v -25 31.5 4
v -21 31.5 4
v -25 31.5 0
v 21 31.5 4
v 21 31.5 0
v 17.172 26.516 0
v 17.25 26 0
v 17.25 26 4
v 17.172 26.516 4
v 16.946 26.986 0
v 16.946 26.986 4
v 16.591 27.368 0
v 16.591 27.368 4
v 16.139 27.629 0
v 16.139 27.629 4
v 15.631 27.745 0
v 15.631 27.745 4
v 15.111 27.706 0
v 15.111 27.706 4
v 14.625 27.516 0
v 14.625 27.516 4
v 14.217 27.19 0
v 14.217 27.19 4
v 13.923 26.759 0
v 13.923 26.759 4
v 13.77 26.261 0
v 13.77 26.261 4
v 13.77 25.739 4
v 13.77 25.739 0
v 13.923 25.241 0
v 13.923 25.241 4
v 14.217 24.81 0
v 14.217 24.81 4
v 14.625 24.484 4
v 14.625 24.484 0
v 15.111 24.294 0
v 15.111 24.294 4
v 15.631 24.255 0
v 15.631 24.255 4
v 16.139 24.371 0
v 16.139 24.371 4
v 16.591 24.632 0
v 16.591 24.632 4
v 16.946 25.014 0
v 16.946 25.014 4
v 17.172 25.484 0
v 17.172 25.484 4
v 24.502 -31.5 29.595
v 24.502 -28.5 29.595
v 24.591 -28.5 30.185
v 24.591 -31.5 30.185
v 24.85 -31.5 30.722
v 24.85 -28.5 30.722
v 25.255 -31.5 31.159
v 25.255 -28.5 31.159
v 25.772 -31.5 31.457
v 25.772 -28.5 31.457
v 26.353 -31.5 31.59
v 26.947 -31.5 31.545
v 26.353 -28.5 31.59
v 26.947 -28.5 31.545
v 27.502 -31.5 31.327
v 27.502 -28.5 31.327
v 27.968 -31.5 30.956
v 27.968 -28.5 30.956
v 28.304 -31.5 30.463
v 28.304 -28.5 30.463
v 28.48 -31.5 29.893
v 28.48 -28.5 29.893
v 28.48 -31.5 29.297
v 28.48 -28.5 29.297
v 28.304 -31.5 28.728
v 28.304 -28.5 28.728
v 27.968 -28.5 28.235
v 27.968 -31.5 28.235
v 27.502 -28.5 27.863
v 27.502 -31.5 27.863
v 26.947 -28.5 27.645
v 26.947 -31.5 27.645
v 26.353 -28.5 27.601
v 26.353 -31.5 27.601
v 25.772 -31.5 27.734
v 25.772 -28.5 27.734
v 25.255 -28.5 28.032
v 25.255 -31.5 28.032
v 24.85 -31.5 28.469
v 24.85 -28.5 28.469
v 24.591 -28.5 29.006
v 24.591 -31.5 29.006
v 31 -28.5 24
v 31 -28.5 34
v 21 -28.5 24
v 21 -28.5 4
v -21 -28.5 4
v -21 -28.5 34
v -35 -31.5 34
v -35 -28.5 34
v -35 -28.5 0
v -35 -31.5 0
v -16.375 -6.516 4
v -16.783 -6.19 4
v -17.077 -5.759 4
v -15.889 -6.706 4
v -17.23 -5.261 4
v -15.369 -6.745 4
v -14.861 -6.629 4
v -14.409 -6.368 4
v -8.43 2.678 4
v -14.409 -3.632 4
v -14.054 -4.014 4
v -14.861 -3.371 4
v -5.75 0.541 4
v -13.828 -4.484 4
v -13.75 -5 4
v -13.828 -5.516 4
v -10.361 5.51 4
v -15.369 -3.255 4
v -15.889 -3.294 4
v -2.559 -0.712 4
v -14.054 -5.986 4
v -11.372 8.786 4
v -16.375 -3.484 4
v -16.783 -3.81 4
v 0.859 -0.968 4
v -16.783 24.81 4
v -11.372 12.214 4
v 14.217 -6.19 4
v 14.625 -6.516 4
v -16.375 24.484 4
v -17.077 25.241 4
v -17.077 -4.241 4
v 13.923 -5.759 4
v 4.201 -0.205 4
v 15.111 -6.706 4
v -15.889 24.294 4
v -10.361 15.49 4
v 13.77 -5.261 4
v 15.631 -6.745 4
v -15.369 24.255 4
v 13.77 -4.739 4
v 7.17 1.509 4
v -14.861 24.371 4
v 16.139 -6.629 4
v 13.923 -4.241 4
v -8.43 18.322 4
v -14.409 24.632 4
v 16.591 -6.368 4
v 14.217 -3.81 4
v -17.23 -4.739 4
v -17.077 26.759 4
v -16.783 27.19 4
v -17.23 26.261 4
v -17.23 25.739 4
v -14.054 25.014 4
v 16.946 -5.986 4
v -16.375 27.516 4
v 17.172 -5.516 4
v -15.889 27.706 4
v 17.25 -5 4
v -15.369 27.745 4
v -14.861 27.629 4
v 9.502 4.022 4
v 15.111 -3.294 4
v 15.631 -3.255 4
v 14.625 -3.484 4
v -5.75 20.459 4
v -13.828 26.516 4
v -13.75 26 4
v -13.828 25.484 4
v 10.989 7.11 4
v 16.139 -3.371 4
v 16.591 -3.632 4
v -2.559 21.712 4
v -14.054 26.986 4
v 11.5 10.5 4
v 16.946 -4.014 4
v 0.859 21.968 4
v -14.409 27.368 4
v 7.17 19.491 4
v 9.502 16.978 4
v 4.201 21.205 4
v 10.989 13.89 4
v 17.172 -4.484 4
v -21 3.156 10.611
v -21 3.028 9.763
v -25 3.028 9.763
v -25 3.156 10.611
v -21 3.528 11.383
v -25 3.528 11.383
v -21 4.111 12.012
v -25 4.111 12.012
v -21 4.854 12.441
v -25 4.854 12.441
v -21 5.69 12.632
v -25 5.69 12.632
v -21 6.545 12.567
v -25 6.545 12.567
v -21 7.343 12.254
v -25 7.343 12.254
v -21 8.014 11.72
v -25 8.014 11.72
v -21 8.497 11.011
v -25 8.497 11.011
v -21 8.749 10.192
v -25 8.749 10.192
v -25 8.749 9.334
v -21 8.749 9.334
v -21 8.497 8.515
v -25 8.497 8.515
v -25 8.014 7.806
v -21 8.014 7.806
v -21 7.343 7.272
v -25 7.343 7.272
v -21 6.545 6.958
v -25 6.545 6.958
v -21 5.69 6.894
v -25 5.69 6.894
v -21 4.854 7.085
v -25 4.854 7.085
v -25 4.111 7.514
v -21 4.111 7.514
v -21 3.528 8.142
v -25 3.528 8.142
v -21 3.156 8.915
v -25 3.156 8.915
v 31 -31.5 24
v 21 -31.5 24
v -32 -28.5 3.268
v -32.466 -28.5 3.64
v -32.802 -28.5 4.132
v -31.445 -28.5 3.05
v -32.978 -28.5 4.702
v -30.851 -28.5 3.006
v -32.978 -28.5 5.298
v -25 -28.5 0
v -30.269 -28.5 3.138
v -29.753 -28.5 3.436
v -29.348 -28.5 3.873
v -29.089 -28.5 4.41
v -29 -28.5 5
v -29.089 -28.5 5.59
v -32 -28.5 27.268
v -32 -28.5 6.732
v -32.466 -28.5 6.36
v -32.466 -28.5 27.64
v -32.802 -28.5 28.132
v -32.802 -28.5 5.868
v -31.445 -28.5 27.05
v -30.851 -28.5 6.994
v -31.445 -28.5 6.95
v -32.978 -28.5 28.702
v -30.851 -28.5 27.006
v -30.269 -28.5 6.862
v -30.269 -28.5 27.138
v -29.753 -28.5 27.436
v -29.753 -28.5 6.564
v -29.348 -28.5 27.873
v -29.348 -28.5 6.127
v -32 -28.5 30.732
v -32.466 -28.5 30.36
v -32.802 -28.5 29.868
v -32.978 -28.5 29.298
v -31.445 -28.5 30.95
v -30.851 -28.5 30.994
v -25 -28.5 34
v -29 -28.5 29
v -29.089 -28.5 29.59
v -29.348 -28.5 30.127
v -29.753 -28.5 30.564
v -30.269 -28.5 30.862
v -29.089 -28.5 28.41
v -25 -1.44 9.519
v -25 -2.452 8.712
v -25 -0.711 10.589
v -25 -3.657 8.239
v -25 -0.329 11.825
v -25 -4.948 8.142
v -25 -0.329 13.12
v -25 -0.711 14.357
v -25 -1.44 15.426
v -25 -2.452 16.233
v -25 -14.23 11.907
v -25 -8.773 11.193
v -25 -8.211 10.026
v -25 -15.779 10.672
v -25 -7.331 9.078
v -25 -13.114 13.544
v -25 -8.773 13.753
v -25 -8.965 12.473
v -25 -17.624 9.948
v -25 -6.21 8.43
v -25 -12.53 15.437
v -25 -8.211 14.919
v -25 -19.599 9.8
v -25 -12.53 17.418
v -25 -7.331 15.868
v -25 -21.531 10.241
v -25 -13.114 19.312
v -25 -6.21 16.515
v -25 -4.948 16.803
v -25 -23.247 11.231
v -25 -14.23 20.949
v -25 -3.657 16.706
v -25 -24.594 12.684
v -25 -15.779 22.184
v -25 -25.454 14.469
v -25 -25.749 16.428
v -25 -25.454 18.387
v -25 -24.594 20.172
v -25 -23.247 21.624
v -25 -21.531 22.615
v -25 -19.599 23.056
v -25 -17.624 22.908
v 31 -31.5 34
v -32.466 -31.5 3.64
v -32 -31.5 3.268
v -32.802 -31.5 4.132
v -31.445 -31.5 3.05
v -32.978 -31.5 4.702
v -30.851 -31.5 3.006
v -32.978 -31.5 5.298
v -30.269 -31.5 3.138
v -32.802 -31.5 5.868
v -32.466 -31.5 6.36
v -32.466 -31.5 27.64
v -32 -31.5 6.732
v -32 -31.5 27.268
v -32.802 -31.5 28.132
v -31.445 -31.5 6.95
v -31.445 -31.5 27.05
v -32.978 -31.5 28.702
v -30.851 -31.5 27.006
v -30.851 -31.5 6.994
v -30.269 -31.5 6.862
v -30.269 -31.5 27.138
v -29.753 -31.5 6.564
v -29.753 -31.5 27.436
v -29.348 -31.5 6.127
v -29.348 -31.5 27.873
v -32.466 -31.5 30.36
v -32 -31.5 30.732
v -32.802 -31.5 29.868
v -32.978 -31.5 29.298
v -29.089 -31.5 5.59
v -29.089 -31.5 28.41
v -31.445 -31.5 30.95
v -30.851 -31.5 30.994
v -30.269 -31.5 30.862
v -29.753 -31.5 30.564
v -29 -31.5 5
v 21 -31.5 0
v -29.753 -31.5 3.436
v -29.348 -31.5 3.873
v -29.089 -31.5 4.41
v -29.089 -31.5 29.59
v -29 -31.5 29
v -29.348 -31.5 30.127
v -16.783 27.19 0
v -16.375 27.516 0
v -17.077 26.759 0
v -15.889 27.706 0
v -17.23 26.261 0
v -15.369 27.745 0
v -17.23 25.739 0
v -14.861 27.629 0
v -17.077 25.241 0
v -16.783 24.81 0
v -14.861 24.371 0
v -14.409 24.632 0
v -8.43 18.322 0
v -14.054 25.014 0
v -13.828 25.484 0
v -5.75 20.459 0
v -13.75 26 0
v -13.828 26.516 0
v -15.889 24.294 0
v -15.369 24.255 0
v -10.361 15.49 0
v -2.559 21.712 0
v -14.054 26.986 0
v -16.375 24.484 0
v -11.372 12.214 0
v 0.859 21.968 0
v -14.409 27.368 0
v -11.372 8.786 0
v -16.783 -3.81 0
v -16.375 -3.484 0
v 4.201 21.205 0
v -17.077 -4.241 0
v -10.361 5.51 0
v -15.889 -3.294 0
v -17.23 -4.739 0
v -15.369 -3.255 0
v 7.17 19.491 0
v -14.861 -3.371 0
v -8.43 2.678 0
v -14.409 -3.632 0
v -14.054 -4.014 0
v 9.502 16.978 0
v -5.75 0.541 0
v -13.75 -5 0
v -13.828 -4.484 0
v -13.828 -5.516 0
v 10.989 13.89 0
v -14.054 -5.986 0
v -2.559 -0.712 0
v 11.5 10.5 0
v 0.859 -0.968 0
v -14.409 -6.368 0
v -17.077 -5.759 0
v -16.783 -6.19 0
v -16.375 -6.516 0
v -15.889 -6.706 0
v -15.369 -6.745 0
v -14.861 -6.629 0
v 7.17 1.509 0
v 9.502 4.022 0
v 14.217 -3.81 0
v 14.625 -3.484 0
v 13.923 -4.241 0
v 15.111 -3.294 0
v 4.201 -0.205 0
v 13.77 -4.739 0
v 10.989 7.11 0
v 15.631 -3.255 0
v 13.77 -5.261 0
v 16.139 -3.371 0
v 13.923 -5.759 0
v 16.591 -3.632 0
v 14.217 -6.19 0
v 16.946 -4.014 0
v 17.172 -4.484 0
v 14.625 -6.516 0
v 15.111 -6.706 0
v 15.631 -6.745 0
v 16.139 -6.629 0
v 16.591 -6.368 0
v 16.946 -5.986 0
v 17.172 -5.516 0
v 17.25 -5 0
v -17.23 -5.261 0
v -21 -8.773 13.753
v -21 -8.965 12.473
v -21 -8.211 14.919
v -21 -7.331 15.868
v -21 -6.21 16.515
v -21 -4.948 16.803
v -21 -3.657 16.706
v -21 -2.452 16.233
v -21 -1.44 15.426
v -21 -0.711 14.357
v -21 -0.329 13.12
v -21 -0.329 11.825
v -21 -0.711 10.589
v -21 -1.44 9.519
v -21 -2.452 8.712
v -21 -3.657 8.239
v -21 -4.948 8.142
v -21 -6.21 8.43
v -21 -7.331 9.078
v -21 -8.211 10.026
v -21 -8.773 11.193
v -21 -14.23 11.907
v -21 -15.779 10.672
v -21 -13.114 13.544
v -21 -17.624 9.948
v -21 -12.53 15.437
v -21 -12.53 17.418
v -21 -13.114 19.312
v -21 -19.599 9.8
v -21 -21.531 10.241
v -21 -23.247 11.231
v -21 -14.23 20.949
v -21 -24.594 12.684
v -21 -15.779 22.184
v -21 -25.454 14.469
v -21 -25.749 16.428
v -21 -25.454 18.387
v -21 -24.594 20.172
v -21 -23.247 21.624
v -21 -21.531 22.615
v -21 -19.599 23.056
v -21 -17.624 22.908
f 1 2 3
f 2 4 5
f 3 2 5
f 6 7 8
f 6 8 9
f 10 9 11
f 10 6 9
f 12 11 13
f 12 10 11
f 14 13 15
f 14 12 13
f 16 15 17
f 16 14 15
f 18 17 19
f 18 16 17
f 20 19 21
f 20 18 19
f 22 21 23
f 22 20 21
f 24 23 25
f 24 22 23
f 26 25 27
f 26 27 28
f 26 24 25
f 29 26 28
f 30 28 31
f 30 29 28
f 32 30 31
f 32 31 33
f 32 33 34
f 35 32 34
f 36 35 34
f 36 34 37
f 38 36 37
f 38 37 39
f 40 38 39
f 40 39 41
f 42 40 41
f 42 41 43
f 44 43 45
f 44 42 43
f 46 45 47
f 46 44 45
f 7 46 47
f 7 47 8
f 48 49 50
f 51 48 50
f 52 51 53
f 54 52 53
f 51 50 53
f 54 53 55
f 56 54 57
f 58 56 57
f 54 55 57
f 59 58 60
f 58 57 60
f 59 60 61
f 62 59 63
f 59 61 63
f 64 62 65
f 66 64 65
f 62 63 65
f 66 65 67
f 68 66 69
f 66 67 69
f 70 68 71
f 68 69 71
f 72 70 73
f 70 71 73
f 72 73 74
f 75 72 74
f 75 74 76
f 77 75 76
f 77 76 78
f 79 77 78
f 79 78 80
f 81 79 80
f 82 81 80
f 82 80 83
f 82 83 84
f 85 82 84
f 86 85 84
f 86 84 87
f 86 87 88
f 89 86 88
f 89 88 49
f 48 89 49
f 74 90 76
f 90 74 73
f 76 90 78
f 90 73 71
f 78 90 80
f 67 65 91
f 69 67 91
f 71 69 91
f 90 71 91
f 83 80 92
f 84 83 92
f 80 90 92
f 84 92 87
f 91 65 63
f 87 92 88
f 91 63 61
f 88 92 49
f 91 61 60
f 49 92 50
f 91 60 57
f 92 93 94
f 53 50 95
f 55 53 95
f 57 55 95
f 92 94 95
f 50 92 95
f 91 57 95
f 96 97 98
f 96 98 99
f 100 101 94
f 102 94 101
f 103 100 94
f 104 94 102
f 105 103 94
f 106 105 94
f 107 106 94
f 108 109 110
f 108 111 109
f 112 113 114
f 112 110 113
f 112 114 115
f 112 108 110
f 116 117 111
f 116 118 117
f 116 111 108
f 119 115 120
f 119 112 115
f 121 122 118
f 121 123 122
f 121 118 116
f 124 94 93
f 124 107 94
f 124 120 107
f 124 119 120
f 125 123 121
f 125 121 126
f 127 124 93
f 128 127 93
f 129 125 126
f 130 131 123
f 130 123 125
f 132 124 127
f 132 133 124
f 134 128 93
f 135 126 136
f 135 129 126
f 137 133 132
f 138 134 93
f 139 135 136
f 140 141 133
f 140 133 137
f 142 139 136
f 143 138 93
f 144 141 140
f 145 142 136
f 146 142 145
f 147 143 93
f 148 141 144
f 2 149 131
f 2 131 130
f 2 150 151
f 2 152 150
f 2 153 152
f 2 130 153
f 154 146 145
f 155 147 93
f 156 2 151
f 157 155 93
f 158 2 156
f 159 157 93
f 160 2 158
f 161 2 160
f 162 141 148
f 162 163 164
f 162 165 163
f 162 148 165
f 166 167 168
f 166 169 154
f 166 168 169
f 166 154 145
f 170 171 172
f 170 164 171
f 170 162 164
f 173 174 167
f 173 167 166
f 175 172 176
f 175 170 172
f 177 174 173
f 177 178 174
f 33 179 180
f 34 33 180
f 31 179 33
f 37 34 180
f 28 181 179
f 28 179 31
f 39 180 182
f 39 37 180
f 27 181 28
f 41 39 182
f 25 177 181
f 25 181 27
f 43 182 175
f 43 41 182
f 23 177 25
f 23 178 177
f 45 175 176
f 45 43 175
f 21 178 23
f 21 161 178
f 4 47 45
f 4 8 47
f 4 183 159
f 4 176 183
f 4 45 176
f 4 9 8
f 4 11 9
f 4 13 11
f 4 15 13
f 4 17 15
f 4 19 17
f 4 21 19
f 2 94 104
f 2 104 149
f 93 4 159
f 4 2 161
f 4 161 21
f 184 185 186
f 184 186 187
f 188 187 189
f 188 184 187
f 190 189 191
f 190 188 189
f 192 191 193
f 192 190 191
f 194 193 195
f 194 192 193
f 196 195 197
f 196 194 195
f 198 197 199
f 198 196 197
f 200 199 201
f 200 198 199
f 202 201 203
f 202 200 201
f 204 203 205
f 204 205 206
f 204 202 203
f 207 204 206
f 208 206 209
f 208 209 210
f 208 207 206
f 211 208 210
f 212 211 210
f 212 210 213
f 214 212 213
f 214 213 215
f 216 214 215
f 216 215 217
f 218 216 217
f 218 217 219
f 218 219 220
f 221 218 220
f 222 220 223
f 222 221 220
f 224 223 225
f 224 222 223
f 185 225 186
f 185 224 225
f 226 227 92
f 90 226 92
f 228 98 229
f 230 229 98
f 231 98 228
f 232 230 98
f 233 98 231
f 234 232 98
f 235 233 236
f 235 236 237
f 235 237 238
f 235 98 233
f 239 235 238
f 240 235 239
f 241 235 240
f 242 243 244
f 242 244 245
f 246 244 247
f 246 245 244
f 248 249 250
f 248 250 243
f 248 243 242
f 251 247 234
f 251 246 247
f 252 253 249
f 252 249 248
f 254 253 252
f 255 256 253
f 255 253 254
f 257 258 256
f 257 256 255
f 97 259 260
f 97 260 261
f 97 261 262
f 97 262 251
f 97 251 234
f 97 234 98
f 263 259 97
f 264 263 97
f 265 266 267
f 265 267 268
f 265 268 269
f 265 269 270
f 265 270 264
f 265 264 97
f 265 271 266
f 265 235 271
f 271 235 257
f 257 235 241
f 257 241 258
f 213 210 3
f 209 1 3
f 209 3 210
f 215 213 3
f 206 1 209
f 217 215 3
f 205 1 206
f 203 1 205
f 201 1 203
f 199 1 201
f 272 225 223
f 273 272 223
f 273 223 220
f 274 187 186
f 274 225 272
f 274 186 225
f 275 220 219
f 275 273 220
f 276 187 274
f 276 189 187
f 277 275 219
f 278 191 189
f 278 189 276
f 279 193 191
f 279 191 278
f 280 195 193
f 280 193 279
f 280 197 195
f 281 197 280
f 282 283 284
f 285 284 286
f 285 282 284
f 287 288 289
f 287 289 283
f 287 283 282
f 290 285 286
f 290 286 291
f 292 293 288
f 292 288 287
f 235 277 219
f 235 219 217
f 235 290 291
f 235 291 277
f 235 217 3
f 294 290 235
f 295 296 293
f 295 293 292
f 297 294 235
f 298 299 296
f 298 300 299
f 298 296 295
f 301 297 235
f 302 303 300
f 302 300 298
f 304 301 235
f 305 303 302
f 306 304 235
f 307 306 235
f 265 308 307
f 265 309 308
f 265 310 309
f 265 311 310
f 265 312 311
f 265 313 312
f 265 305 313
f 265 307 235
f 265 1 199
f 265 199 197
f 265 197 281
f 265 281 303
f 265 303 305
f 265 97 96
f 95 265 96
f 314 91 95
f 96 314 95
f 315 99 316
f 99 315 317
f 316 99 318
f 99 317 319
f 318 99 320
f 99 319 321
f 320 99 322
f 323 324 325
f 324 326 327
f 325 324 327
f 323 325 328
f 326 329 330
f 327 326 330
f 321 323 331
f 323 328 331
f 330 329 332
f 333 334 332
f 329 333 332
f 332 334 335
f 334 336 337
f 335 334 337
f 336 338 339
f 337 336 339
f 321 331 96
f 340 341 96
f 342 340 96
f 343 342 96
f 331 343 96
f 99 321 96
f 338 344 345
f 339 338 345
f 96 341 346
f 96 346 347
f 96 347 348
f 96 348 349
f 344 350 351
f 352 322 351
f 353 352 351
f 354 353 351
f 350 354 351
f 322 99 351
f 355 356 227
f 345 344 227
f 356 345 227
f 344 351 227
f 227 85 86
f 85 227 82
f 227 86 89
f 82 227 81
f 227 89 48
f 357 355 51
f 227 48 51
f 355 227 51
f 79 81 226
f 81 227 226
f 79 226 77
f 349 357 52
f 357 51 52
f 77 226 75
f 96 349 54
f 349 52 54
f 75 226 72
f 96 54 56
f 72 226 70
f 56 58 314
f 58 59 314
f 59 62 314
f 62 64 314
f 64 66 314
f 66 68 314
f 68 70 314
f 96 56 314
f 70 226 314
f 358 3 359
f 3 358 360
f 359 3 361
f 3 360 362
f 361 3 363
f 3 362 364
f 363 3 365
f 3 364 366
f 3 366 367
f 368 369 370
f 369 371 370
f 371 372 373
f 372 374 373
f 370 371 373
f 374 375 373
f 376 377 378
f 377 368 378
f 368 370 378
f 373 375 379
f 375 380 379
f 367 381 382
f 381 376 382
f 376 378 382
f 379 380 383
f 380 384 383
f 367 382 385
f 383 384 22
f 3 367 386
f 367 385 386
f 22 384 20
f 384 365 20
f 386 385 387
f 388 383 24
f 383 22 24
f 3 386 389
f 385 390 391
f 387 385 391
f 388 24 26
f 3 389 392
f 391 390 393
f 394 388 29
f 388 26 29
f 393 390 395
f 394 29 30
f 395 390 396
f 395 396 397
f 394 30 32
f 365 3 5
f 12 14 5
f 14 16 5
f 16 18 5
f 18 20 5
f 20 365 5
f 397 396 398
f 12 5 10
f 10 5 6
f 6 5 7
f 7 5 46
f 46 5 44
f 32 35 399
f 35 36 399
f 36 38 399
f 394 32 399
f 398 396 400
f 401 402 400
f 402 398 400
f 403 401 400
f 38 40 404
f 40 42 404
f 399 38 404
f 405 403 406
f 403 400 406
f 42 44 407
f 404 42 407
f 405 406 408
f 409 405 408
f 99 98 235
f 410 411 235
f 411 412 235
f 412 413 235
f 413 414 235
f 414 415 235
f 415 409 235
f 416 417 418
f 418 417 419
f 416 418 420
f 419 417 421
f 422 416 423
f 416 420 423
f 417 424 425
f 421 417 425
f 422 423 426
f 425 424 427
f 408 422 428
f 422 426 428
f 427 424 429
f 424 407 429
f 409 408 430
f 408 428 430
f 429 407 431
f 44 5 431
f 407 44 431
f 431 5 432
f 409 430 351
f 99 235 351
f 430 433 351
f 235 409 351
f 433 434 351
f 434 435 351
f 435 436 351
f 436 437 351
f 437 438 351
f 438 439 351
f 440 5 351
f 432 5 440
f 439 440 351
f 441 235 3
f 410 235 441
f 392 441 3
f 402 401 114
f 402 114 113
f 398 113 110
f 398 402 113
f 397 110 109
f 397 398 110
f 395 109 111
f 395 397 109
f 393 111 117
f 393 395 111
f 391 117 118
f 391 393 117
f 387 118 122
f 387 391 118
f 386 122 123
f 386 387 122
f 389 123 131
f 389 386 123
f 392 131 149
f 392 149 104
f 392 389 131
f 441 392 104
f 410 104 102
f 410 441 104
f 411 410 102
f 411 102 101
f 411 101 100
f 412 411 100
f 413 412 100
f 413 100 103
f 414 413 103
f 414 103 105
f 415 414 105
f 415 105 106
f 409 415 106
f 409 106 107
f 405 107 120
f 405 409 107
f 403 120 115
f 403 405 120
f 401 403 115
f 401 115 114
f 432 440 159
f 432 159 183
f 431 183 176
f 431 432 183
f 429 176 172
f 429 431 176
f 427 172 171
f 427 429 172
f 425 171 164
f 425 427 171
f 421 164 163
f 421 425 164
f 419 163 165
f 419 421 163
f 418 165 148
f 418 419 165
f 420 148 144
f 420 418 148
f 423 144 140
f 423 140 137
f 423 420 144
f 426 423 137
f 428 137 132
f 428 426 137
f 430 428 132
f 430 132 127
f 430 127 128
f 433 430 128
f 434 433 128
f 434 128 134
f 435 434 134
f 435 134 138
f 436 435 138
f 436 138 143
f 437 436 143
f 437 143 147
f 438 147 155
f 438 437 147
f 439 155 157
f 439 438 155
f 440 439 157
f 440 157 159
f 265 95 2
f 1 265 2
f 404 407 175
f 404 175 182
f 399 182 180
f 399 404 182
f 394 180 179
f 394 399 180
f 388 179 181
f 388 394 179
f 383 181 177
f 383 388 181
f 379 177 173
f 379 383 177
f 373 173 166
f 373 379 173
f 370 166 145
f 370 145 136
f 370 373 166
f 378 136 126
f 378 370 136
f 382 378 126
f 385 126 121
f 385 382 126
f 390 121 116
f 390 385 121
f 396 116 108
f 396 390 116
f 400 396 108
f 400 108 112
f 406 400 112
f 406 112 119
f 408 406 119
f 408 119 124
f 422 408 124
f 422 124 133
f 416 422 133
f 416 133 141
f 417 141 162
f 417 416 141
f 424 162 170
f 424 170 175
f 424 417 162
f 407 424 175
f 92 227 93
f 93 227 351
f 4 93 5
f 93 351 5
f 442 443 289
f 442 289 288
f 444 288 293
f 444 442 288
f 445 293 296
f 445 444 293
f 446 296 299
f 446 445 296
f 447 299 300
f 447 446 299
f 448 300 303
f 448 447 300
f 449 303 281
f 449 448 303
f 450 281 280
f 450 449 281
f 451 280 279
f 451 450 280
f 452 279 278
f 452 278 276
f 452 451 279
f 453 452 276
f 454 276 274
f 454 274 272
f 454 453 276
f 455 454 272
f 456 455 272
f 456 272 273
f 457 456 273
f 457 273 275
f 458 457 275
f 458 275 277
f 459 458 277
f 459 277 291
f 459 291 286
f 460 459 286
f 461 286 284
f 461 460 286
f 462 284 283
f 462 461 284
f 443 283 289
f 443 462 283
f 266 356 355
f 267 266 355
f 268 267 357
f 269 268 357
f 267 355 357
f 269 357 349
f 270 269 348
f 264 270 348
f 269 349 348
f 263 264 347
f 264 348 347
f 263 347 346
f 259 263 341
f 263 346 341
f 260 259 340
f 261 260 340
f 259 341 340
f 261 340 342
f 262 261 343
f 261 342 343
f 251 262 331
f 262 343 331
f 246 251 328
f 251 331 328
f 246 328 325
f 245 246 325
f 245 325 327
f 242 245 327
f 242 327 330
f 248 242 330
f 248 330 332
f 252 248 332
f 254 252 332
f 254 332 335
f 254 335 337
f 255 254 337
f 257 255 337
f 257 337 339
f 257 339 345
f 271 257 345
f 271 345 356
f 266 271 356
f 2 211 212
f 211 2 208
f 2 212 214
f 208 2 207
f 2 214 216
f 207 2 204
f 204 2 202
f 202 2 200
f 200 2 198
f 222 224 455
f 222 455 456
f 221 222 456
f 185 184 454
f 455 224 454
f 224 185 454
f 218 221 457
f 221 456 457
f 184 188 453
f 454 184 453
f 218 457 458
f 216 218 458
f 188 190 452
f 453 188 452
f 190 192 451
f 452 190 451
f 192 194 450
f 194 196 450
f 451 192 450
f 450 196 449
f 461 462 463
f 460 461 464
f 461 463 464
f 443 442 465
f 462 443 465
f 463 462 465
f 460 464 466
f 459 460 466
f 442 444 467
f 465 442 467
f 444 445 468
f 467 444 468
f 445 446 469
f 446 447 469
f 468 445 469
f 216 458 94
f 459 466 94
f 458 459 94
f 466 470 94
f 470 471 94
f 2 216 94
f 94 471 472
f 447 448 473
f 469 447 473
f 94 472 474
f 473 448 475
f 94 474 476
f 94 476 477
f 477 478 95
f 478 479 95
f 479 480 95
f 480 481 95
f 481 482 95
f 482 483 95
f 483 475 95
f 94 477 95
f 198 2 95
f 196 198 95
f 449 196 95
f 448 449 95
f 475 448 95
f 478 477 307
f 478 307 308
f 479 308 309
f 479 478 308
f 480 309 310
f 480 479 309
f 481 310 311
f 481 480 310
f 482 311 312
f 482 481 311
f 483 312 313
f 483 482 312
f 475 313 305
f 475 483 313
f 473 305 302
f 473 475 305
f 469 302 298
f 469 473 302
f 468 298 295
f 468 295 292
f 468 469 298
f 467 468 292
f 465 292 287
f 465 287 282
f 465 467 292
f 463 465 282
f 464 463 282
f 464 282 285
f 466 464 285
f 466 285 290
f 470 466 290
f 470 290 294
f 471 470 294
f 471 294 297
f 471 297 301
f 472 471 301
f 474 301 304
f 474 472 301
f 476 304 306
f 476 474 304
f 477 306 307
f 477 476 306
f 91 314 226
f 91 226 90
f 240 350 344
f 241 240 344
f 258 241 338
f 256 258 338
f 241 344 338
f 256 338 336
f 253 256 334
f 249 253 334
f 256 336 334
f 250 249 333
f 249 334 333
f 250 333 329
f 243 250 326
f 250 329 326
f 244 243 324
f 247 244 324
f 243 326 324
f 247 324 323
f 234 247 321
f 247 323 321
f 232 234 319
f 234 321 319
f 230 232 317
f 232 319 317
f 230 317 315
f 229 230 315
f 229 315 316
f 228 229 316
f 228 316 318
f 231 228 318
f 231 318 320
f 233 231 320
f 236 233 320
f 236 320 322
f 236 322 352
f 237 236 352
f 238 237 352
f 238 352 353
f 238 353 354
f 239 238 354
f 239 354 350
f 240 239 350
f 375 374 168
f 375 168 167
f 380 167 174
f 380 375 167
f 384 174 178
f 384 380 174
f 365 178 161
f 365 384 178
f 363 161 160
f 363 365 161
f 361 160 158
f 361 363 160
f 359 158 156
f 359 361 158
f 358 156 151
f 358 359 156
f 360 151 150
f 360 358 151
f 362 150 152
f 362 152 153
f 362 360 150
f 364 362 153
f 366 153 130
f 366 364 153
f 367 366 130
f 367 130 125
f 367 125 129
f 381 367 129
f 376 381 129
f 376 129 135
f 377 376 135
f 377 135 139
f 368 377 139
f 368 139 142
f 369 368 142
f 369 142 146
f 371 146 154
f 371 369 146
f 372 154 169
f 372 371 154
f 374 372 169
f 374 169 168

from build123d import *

# Parameters (mm, degrees)
F0_W      = 42
F0_H      = 63
F0_R      = 1.75
F0_R_2    = 11.5
F1_DEPTH  = 4
F2_W      = 42
F2_H      = 3
F3_DEPTH  = 30
F4_R      = 2.876713
F4_R_2    = 4.342344
F4_R_3    = 6.646556
F5_DEPTH  = 4
F6_W      = 3
F6_H      = 10
F7_DEPTH  = 10
F8_R      = 2
F9_DEPTH  = 25
F10_W     = 3
F10_H     = 34
F11_DEPTH = 10
F12_R     = 2
F13_DEPTH = 25


with BuildPart() as f1:
    # F0 (on Top) → F1 (new body)
    with BuildSketch(Plane.XY):
        Rectangle(F0_W, F0_H)
        with Locations((-15.5, -5)):
            Circle(F0_R, mode=Mode.SUBTRACT)
        with Locations((15.5, -5)):
            Circle(F0_R, mode=Mode.SUBTRACT)
        with Locations((-15.5, 26)):
            Circle(F0_R, mode=Mode.SUBTRACT)
        with Locations((0, 10.5)):
            Circle(F0_R_2, mode=Mode.SUBTRACT)
        with Locations((15.5, 26)):
            Circle(F0_R, mode=Mode.SUBTRACT)
    extrude(amount=F1_DEPTH)

    # F2 (on face) → F3 (join)
    with BuildSketch(Plane.XY.offset(4)):
        with Locations((0, -30)):
            Rectangle(F2_W, F2_H)
    extrude(amount=F3_DEPTH)

    # F4 (on face) → F5 (join)
    with BuildSketch(Plane(origin=(-21, 0, 0), x_dir=(0, -1, 0), z_dir=(-1, 0, 0))):
        Polygon((28.5, 34), (-31.5, 4), (28.5, 4), align=None)
        with Locations((-5.90477, 9.762893)):
            Circle(F4_R, mode=Mode.SUBTRACT)
        with Locations((4.623126, 12.472619)):
            Circle(F4_R_2, mode=Mode.SUBTRACT)
        with Locations((19.102728, 16.427787)):
            Circle(F4_R_3, mode=Mode.SUBTRACT)
        Polygon((28.5, 4), (-31.5, 4), (-31.5, 0), (31.5, 0), (31.5, 34), (28.5, 34), align=None)
    extrude(amount=F5_DEPTH)

    # F6 (on face) → F7 (join)
    with BuildSketch(Plane.YZ.offset(21)):
        with Locations((-30, 29)):
            Rectangle(F6_W, F6_H)
    extrude(amount=F7_DEPTH)

    # F8 (on face) → F9 (cut)
    with BuildSketch(Plane(origin=(0, -28.5, 0), x_dir=(-1, 0, 0), z_dir=(0, 1, 0))):
        with Locations((-26.502214, 29.595299)):
            Circle(F8_R)
    extrude(amount=-F9_DEPTH, mode=Mode.SUBTRACT)

    # F10 (on face) → F11 (join)
    with BuildSketch(Plane(origin=(-25, 0, 0), x_dir=(0, -1, 0), z_dir=(-1, 0, 0))):
        with Locations((30, 17)):
            Rectangle(F10_W, F10_H)
    extrude(amount=F11_DEPTH)

    # F12 (on face) → F13 (cut)
    with BuildSketch(Plane.XZ.offset(31.5)):
        with Locations((-31, 29)):
            Circle(F12_R)
        with Locations((-31, 5)):
            Circle(F12_R)
    extrude(amount=-F13_DEPTH, mode=Mode.SUBTRACT)


solid = f1.part
